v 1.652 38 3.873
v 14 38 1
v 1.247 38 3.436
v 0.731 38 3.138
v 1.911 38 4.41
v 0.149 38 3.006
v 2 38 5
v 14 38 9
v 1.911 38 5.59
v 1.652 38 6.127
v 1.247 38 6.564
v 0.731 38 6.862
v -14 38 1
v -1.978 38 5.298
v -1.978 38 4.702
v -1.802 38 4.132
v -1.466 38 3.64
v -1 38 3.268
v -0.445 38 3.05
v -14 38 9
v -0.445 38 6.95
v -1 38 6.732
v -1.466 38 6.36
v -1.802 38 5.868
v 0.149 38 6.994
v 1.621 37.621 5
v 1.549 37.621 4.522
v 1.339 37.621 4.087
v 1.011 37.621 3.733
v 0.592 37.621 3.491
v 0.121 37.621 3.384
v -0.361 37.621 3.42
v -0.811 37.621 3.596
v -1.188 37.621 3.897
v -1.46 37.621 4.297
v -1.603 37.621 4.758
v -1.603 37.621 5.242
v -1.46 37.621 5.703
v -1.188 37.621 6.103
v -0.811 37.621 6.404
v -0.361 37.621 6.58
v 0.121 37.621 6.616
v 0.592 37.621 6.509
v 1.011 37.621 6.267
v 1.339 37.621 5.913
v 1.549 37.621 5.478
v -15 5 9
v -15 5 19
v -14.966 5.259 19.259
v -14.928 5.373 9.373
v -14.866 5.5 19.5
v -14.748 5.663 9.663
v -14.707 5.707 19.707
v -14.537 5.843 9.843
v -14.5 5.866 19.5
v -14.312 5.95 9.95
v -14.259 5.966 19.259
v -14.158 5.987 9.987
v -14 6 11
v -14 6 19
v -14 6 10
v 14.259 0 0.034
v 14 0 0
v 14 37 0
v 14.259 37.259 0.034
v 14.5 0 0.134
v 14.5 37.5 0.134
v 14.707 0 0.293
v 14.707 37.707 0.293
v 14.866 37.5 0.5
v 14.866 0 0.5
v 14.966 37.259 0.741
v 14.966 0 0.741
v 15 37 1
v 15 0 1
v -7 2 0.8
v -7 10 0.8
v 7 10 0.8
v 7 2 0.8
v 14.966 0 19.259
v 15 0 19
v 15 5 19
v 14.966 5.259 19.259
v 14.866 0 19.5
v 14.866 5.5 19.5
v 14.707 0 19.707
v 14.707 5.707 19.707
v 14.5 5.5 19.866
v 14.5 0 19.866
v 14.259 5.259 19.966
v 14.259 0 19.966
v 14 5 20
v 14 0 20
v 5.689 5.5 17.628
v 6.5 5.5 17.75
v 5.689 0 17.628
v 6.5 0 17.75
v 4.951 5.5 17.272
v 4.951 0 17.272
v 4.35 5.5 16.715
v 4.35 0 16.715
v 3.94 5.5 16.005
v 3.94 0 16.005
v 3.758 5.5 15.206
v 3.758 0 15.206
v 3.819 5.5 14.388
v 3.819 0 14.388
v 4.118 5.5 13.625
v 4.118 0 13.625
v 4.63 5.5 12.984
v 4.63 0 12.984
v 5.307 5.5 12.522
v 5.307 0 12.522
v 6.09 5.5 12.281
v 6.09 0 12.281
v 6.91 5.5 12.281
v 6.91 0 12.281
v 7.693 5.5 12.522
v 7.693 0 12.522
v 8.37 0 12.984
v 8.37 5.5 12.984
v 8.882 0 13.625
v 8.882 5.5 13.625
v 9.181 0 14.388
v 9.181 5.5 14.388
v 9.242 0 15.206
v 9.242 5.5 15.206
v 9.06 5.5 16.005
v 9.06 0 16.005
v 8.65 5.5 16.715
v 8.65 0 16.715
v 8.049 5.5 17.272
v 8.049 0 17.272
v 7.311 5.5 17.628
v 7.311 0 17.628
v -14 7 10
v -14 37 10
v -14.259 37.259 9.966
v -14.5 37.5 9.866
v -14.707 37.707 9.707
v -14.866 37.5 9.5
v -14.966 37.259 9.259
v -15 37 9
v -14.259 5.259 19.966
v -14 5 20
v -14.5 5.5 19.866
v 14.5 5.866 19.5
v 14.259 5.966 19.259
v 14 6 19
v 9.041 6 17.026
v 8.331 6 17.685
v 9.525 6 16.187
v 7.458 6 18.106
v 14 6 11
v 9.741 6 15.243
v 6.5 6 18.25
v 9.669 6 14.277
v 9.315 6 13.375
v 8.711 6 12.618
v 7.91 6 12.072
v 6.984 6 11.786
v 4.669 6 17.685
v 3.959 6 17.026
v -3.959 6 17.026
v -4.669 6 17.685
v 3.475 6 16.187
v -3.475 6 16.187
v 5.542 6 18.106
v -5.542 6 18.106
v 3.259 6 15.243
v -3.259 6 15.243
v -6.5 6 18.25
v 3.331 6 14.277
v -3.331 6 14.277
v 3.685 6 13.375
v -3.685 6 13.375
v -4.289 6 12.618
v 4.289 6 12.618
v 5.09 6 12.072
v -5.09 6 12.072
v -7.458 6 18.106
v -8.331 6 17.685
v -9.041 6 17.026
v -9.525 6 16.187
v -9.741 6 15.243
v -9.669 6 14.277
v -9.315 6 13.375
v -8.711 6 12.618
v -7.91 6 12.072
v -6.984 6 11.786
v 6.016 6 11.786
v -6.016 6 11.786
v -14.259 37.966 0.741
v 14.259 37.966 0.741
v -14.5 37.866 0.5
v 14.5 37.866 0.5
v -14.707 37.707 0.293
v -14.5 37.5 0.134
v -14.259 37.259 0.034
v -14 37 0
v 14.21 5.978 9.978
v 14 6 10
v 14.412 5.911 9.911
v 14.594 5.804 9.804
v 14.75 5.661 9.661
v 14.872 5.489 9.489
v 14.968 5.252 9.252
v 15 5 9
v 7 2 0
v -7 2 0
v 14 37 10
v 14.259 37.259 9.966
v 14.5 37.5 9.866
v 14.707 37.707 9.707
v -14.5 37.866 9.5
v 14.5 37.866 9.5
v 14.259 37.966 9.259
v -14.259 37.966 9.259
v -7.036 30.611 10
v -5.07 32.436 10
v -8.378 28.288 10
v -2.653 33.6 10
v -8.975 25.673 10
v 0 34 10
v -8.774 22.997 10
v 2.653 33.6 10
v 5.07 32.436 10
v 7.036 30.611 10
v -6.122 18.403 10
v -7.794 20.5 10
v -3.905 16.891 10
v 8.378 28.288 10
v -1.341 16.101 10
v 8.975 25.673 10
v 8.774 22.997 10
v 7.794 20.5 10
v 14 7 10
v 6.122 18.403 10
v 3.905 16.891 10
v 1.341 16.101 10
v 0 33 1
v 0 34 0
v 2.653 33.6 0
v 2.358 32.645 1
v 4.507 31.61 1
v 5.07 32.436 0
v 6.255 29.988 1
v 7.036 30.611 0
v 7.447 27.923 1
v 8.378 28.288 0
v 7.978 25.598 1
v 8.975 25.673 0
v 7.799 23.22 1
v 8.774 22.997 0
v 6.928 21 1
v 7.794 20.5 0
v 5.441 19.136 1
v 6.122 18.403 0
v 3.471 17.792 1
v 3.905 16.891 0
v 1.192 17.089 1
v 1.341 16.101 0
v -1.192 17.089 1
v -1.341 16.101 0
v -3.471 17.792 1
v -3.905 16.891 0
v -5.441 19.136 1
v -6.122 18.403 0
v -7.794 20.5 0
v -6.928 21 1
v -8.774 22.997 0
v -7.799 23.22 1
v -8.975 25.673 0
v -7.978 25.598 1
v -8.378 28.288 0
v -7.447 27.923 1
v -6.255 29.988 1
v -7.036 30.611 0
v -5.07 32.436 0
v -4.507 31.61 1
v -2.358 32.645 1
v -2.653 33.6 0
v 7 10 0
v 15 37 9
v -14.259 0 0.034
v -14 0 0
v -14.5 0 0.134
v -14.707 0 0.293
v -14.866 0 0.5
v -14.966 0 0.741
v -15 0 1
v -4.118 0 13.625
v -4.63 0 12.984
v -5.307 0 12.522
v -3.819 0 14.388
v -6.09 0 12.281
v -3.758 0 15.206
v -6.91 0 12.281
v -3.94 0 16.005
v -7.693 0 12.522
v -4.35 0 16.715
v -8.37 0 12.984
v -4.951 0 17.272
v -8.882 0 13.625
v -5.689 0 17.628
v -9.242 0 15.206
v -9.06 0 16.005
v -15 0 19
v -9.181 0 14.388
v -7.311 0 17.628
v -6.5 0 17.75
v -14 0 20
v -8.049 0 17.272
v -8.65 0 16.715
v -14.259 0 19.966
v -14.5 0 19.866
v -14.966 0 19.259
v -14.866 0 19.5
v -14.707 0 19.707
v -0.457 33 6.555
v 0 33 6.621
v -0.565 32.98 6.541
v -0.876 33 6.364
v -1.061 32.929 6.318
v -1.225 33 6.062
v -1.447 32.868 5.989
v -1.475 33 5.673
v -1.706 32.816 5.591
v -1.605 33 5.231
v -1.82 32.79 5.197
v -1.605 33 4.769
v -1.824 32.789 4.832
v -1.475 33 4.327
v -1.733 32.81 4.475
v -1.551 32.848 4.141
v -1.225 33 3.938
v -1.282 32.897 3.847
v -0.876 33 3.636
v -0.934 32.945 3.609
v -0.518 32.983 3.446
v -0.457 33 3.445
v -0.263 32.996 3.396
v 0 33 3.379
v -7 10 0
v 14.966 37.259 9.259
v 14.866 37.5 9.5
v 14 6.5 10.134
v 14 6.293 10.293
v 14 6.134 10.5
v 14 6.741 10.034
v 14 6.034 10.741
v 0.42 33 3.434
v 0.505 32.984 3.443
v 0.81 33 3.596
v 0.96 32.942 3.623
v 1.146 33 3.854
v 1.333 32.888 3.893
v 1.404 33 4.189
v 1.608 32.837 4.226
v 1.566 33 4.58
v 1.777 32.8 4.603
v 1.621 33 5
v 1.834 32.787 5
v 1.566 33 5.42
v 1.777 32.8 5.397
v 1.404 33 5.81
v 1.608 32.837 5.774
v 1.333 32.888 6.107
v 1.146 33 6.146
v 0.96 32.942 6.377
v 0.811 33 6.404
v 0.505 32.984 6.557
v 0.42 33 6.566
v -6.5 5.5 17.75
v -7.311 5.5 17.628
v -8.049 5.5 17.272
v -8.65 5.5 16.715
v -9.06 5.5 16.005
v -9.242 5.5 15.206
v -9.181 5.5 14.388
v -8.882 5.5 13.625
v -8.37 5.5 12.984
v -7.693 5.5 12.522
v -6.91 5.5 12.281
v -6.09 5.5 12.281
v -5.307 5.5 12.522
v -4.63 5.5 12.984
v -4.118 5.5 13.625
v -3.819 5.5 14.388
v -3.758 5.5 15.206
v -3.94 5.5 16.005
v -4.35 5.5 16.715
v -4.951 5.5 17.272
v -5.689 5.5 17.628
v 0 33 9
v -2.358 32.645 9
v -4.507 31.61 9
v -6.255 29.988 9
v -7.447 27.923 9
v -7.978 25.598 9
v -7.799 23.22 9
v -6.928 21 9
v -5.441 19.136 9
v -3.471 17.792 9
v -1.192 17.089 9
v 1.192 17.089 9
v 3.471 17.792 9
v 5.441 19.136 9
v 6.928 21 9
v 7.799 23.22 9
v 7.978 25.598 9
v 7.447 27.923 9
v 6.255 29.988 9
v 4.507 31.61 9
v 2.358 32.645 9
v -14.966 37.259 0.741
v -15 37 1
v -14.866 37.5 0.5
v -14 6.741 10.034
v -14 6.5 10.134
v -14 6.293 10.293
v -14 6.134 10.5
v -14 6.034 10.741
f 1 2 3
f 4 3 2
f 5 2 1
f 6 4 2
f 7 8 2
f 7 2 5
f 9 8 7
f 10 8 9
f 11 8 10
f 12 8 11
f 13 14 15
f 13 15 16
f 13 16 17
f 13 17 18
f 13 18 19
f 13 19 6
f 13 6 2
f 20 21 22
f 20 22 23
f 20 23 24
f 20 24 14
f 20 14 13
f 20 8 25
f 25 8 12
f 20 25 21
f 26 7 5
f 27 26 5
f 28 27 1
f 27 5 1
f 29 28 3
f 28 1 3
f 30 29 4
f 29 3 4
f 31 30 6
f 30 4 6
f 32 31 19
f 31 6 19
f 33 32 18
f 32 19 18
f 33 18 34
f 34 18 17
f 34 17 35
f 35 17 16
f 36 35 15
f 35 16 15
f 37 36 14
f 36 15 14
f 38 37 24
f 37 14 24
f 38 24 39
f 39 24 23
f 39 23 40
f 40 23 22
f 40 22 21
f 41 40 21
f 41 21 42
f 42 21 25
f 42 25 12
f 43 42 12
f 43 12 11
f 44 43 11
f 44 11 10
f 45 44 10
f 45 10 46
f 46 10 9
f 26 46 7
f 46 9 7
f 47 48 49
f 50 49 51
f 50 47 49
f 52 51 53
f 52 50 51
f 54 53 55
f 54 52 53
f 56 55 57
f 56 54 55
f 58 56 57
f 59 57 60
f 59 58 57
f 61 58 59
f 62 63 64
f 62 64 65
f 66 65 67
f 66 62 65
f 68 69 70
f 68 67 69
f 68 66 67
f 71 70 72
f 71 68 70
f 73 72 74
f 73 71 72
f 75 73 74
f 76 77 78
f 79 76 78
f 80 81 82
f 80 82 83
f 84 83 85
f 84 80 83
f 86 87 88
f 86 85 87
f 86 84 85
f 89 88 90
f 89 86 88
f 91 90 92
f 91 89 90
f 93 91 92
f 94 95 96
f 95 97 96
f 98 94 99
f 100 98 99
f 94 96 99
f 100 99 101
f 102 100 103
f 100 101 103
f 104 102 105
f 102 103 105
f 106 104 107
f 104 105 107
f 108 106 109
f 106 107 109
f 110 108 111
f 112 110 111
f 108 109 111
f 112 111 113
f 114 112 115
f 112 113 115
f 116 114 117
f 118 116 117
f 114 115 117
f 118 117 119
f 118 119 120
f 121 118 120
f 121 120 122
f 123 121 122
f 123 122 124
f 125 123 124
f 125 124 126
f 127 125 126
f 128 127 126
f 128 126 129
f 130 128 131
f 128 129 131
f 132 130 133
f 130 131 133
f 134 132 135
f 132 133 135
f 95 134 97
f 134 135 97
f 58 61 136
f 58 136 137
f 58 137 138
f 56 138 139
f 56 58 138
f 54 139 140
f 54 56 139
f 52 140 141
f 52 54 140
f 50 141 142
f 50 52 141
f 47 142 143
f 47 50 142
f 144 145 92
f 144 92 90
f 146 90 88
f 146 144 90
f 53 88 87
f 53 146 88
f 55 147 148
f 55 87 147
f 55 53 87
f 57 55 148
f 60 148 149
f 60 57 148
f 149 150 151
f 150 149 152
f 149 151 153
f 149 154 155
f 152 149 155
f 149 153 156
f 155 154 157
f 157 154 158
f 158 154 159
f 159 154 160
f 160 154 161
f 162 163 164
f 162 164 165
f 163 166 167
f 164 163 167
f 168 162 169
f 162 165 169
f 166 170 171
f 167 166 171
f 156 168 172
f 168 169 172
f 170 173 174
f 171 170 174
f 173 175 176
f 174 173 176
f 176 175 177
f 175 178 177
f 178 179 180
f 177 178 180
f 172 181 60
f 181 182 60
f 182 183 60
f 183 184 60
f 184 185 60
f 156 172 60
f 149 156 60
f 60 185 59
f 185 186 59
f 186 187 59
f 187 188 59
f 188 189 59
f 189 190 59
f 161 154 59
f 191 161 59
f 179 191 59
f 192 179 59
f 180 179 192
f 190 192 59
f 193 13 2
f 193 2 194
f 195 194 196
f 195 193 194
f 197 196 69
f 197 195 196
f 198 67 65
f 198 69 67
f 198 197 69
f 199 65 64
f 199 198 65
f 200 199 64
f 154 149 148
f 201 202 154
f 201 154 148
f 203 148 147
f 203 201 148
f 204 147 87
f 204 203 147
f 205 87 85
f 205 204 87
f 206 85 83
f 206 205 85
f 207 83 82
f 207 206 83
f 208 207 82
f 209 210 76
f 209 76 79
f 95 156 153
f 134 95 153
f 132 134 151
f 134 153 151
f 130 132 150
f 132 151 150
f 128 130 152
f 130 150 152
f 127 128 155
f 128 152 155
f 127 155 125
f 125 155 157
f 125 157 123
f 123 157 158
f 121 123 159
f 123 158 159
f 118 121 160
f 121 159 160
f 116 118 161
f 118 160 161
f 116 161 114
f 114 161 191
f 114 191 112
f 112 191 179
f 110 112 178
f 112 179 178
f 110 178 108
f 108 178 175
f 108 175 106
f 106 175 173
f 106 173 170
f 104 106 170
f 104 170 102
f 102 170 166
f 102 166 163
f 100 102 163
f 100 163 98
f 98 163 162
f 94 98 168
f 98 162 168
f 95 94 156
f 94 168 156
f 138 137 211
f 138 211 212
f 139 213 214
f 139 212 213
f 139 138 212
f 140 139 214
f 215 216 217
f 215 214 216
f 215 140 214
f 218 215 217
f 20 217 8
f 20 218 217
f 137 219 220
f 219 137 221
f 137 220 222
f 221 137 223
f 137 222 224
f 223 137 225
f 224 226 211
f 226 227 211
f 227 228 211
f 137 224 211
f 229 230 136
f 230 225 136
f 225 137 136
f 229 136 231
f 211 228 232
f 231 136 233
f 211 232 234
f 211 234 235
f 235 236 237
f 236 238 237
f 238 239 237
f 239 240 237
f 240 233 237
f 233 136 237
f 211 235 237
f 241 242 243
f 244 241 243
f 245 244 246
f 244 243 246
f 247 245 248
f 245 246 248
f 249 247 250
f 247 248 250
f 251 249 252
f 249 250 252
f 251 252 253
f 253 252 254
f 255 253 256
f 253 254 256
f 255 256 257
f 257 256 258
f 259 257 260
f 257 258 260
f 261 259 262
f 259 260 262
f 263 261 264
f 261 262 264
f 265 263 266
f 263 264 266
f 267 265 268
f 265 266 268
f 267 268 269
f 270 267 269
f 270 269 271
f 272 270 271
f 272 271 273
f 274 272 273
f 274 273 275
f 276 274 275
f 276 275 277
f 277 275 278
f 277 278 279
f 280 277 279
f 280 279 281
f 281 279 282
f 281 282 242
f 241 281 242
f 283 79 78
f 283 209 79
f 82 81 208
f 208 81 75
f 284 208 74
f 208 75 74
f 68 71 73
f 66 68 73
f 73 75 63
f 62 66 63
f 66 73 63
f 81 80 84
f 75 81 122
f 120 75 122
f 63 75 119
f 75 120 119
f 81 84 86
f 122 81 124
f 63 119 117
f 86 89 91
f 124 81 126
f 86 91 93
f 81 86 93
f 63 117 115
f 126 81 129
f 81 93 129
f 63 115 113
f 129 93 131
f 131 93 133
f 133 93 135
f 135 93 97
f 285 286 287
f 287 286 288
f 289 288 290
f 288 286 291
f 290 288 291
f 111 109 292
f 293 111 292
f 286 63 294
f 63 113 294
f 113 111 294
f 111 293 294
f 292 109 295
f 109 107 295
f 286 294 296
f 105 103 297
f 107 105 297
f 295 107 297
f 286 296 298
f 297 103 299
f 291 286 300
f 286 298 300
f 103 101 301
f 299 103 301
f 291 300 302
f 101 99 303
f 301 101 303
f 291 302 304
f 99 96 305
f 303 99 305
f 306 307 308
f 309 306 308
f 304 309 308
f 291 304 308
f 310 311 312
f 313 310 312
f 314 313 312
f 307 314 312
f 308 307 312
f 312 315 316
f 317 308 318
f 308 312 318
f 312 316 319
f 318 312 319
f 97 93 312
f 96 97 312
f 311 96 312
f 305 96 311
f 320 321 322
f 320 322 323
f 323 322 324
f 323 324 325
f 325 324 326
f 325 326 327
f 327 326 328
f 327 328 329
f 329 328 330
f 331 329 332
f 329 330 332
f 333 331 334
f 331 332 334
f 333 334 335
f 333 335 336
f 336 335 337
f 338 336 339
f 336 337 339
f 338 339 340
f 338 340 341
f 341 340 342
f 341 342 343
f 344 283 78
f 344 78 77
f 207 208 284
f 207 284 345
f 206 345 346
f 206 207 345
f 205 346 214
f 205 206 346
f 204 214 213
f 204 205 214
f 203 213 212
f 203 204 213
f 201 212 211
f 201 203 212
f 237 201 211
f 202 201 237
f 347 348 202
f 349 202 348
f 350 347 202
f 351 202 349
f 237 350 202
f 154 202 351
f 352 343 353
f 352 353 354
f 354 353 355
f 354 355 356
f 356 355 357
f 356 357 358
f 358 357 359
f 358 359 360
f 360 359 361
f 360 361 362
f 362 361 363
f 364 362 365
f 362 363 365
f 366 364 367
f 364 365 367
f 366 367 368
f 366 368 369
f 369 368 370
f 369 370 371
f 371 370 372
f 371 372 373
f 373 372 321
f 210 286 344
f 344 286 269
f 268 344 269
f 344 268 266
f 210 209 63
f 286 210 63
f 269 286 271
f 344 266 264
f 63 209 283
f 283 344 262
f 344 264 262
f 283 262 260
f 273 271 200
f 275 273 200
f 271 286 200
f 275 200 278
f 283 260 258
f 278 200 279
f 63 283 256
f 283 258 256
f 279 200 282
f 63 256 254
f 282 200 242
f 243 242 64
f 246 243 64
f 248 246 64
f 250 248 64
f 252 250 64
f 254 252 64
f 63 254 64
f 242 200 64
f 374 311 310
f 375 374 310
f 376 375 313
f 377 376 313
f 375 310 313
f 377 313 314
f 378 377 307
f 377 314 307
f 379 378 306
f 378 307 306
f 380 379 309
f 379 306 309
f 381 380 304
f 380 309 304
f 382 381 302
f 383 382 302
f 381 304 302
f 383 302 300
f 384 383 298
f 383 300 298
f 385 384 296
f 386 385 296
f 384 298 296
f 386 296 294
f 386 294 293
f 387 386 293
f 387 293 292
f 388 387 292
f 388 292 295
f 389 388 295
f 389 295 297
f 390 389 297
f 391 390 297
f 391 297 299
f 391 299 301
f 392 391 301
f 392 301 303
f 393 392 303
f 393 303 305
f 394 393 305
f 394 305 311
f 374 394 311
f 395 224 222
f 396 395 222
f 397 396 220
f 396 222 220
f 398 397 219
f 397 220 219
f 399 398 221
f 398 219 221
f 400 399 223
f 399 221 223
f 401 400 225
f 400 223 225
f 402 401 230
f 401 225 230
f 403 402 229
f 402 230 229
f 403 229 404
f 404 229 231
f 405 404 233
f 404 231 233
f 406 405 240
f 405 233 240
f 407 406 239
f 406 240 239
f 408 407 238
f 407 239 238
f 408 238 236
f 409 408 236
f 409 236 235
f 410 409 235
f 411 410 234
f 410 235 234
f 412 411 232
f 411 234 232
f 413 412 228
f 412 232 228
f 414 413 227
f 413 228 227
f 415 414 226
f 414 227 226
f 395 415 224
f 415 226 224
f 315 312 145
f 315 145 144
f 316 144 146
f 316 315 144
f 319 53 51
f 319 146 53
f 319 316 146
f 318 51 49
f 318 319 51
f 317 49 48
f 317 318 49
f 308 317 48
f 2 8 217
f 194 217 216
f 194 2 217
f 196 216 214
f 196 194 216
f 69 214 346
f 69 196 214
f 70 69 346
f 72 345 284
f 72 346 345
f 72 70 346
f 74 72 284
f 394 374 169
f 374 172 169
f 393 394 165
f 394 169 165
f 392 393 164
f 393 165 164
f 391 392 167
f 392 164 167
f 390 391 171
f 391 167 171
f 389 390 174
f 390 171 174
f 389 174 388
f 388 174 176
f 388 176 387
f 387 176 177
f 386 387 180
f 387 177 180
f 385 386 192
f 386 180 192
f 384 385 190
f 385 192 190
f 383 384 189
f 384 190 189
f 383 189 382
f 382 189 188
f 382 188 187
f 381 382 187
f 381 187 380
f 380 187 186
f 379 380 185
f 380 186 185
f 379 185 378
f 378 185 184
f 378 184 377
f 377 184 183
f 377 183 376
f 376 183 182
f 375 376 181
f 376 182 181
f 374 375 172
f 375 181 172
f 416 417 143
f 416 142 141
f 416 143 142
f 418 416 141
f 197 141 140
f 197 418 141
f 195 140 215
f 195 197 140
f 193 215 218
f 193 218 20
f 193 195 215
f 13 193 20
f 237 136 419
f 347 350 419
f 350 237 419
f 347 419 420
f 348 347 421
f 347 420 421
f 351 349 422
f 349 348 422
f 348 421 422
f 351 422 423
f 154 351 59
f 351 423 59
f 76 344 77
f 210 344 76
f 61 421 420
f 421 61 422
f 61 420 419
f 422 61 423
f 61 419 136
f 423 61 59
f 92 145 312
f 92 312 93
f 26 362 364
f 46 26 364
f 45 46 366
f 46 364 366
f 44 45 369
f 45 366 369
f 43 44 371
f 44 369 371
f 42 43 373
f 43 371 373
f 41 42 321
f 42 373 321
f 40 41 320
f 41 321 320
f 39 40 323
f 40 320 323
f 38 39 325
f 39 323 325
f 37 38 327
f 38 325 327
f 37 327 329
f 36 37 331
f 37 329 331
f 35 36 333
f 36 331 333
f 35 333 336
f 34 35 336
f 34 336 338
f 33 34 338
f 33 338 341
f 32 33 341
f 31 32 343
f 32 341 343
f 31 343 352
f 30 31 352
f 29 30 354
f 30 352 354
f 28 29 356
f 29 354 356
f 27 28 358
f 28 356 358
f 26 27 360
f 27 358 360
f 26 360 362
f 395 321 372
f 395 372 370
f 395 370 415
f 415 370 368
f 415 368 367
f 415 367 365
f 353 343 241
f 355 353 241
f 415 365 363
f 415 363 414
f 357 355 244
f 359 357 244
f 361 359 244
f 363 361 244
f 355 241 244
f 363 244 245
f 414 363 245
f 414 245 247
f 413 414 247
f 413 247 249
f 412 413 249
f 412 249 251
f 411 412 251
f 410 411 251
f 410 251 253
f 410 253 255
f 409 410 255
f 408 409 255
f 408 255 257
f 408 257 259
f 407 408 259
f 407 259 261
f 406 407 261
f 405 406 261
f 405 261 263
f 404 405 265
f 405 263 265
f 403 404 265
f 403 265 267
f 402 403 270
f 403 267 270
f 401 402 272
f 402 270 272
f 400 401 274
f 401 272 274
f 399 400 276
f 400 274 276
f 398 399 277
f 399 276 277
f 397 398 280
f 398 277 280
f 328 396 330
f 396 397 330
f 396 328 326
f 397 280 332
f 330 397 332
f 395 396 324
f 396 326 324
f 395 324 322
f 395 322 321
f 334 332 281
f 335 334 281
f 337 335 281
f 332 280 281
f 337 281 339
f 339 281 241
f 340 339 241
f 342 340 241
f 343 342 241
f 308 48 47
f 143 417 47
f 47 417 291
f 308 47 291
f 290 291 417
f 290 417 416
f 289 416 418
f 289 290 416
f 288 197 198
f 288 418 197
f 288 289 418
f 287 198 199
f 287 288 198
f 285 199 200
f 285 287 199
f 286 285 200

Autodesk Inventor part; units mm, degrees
sketch "Sketch_9" plane through (0, 0, 0) normal (0, 0, 1) x (1, 0, 0)
  line L0 (-15, 5) -> (-15, 0)
  line L1 (-15, 0) -> (15, 0)
  line L2 (15, 0) -> (15, 5)
  arc A0 (15, 5) -> (14, 6) centre (14, 5) ccw
  line L3 (14, 6) -> (-14, 6)
  arc A1 (-14, 6) -> (-15, 5) centre (-14, 5) ccw
sketch "Sketch_10" plane through (0, 0, 0) normal (0, 1, 0) x (-1, 0, 0)
  line L0 (15, 1) -> (15, 9)
  arc A0 (15, 9) -> (14, 10) centre (14, 9) ccw
  line L1 (14, 10) -> (-14, 10)
  arc A1 (-14, 10) -> (-15, 9) centre (-14, 9) ccw
  line L2 (-15, 9) -> (-15, 1)
  arc A2 (-15, 1) -> (-14, 0) centre (-14, 1) ccw
  line L3 (-14, 0) -> (14, 0)
  arc A3 (14, 0) -> (15, 1) centre (14, 1) ccw
extrude "Extrusion1" add sketch "Sketch_9" along normal blind 20
extrude "Extrusion2" add sketch "Sketch_10" along normal blind 38
sketch "Sketch_5" plane through (0, 0, 0) normal (0, 0, 1) x (1, 0, 0)
  arc A0 (-14, 38) -> (-15, 37) centre (-14, 37) ccw
  line L0 (-14, 38) -> (14, 38)
  arc A1 (15, 37) -> (14, 38) centre (14, 37) ccw
  line L1 (15, 37) -> (15, 76)
  line L2 (15, 76) -> (-15, 76)
  line L3 (-15, 76) -> (-15, 37)
extrude "Extrusion3" cut sketch "Sketch_5" along normal blind 10
sketch "Sketch_7" plane through (0, 0, 0) normal (1, 0, 0) x (0, 1, 0)
  line L0 (25, 0) -> (25, 10)
  line L1 (25, 10) -> (34, 10)
  line L2 (34, 10) -> (33, 9)
  line L3 (33, 9) -> (33, 1)
  line L4 (33, 1) -> (34, 0)
  line L5 (34, 0) -> (25, 0)
  line L6 (25, 0) -> (25, 10)
revolve "Revolution1" cut sketch "Sketch_7" angle 360 about axis through (0, 25, 0) along (0, 0, -1)
sketch "Sketch_1" plane through (0, 0, 5) normal (0, 0, 1) x (1, 0, 0)
  line L0 (0, 25) -> (0, 38)
  line L1 (0, 38) -> (2, 38)
  line L2 (2, 38) -> (1.621, 37.621)
  line L3 (1.621, 37.621) -> (1.621, 33)
  line L4 (1.621, 33) -> (2, 32.621)
  line L5 (2, 32.621) -> (2, 25)
  line L6 (2, 25) -> (0, 25)
  line L7 (0, 25) -> (0, 38)
revolve "Revolution2" cut sketch "Sketch_1" angle 360 about axis through (0, 25, 5) along (0, -1, 0)
thread "Thread1" size "M4x0.7" class "6H" standard "ISO Metric profile" full length
sketch "Sketch6" plane through (-14, 6, 20) normal (0, 1, 0) x (1, 0, 0)
  point P0 (7.5, 5)
hole "Hole1" at (-6.5, 6, 15) direction (0, -1, 0) diameter 5.5 depth 6 countersink diameter 6.5 countersink angle 90
sketch "Sketch7" plane through (-14, 6, 20) normal (0, 1, 0) x (1, 0, 0)
  point P0 (20.5, 5)
hole "Hole2" at (6.5, 6, 15) direction (0, -1, 0) diameter 5.5 depth 6 countersink diameter 6.5 countersink angle 90
sketch "Sketch_4" plane through (0, 0, 0) normal (0, 1, 0) x (-1, 0, 0)
  line L0 (30, -10) -> (30, 30)
  line L1 (30, 30) -> (-30, 30)
  line L2 (-30, 30) -> (-30, -10)
  line L3 (-30, -10) -> (30, -10)
  line L4 (15, 1) -> (15, 19)
  arc A0 (15, 19) -> (14, 20) centre (14, 19) ccw
  line L5 (14, 20) -> (-14, 20)
  arc A1 (-14, 20) -> (-15, 19) centre (-14, 19) ccw
  line L6 (-15, 19) -> (-15, 1)
  arc A2 (-15, 1) -> (-14, 0) centre (-14, 1) ccw
  line L7 (-14, 0) -> (14, 0)
  arc A3 (14, 0) -> (15, 1) centre (14, 1) ccw
extrude "Extrusion4" cut sketch "Sketch_4" along normal blind 38
sketch "Sketch_8" plane through (0, 0, 0) normal (0, 0, 1) x (1, 0, 0)
  line L0 (-7, 10) -> (-7, 2)
  line L1 (-7, 2) -> (7, 2)
  line L2 (7, 2) -> (7, 10)
  line L3 (7, 10) -> (-7, 10)
extrude "Extrusion5" cut sketch "Sketch_8" along normal blind 0.8
sketch "Sketch_6" plane through (0, 0, 0) normal (1, 0, 0) x (0, 1, 0)
  line L0 (57, 30) -> (-19, 30)
  line L1 (-19, 30) -> (-19, -10)
  line L2 (-19, -10) -> (57, -10)
  line L3 (57, -10) -> (57, 30)
  line L4 (5, 20) -> (0, 20)
  line L5 (0, 20) -> (0, 0)
  line L6 (0, 0) -> (37, 0)
  arc A0 (37, 0) -> (38, 1) centre (37, 1) ccw
  line L7 (38, 1) -> (38, 9)
  arc A1 (38, 9) -> (37, 10) centre (37, 9) ccw
  line L8 (37, 10) -> (6, 10)
  line L9 (6, 10) -> (6, 19)
  arc A2 (6, 19) -> (5, 20) centre (5, 19) ccw
extrude "Extrusion6" cut sketch "Sketch_6" along normal mid plane 30
sketch "Sketch_11" plane through (0, 0, 0) normal (1, 0, 0) x (0, 1, 0)
  line L0 (6, 11) -> (3, 11)
  line L1 (3, 11) -> (3, 5)
  line L2 (3, 5) -> (7, 5)
  line L3 (7, 5) -> (7, 10)
  arc A0 (6, 11) -> (7, 10) centre (7, 11) ccw
extrude "Extrusion7" add sketch "Sketch_11" along normal mid plane 28
ref_plane "b_s_XY" through (0, 38, 5) normal (0, 1, 0) x (1, 0, 0)
ref_plane "b_s_YZ" through (0, 38, 5) normal (1, 0, 0) x (0, 0, -1)
ref_plane "b_s_ZX" through (0, 38, 5) normal (0, 0, -1) x (0, 1, 0)
properties part number "SHKLMT16b"
